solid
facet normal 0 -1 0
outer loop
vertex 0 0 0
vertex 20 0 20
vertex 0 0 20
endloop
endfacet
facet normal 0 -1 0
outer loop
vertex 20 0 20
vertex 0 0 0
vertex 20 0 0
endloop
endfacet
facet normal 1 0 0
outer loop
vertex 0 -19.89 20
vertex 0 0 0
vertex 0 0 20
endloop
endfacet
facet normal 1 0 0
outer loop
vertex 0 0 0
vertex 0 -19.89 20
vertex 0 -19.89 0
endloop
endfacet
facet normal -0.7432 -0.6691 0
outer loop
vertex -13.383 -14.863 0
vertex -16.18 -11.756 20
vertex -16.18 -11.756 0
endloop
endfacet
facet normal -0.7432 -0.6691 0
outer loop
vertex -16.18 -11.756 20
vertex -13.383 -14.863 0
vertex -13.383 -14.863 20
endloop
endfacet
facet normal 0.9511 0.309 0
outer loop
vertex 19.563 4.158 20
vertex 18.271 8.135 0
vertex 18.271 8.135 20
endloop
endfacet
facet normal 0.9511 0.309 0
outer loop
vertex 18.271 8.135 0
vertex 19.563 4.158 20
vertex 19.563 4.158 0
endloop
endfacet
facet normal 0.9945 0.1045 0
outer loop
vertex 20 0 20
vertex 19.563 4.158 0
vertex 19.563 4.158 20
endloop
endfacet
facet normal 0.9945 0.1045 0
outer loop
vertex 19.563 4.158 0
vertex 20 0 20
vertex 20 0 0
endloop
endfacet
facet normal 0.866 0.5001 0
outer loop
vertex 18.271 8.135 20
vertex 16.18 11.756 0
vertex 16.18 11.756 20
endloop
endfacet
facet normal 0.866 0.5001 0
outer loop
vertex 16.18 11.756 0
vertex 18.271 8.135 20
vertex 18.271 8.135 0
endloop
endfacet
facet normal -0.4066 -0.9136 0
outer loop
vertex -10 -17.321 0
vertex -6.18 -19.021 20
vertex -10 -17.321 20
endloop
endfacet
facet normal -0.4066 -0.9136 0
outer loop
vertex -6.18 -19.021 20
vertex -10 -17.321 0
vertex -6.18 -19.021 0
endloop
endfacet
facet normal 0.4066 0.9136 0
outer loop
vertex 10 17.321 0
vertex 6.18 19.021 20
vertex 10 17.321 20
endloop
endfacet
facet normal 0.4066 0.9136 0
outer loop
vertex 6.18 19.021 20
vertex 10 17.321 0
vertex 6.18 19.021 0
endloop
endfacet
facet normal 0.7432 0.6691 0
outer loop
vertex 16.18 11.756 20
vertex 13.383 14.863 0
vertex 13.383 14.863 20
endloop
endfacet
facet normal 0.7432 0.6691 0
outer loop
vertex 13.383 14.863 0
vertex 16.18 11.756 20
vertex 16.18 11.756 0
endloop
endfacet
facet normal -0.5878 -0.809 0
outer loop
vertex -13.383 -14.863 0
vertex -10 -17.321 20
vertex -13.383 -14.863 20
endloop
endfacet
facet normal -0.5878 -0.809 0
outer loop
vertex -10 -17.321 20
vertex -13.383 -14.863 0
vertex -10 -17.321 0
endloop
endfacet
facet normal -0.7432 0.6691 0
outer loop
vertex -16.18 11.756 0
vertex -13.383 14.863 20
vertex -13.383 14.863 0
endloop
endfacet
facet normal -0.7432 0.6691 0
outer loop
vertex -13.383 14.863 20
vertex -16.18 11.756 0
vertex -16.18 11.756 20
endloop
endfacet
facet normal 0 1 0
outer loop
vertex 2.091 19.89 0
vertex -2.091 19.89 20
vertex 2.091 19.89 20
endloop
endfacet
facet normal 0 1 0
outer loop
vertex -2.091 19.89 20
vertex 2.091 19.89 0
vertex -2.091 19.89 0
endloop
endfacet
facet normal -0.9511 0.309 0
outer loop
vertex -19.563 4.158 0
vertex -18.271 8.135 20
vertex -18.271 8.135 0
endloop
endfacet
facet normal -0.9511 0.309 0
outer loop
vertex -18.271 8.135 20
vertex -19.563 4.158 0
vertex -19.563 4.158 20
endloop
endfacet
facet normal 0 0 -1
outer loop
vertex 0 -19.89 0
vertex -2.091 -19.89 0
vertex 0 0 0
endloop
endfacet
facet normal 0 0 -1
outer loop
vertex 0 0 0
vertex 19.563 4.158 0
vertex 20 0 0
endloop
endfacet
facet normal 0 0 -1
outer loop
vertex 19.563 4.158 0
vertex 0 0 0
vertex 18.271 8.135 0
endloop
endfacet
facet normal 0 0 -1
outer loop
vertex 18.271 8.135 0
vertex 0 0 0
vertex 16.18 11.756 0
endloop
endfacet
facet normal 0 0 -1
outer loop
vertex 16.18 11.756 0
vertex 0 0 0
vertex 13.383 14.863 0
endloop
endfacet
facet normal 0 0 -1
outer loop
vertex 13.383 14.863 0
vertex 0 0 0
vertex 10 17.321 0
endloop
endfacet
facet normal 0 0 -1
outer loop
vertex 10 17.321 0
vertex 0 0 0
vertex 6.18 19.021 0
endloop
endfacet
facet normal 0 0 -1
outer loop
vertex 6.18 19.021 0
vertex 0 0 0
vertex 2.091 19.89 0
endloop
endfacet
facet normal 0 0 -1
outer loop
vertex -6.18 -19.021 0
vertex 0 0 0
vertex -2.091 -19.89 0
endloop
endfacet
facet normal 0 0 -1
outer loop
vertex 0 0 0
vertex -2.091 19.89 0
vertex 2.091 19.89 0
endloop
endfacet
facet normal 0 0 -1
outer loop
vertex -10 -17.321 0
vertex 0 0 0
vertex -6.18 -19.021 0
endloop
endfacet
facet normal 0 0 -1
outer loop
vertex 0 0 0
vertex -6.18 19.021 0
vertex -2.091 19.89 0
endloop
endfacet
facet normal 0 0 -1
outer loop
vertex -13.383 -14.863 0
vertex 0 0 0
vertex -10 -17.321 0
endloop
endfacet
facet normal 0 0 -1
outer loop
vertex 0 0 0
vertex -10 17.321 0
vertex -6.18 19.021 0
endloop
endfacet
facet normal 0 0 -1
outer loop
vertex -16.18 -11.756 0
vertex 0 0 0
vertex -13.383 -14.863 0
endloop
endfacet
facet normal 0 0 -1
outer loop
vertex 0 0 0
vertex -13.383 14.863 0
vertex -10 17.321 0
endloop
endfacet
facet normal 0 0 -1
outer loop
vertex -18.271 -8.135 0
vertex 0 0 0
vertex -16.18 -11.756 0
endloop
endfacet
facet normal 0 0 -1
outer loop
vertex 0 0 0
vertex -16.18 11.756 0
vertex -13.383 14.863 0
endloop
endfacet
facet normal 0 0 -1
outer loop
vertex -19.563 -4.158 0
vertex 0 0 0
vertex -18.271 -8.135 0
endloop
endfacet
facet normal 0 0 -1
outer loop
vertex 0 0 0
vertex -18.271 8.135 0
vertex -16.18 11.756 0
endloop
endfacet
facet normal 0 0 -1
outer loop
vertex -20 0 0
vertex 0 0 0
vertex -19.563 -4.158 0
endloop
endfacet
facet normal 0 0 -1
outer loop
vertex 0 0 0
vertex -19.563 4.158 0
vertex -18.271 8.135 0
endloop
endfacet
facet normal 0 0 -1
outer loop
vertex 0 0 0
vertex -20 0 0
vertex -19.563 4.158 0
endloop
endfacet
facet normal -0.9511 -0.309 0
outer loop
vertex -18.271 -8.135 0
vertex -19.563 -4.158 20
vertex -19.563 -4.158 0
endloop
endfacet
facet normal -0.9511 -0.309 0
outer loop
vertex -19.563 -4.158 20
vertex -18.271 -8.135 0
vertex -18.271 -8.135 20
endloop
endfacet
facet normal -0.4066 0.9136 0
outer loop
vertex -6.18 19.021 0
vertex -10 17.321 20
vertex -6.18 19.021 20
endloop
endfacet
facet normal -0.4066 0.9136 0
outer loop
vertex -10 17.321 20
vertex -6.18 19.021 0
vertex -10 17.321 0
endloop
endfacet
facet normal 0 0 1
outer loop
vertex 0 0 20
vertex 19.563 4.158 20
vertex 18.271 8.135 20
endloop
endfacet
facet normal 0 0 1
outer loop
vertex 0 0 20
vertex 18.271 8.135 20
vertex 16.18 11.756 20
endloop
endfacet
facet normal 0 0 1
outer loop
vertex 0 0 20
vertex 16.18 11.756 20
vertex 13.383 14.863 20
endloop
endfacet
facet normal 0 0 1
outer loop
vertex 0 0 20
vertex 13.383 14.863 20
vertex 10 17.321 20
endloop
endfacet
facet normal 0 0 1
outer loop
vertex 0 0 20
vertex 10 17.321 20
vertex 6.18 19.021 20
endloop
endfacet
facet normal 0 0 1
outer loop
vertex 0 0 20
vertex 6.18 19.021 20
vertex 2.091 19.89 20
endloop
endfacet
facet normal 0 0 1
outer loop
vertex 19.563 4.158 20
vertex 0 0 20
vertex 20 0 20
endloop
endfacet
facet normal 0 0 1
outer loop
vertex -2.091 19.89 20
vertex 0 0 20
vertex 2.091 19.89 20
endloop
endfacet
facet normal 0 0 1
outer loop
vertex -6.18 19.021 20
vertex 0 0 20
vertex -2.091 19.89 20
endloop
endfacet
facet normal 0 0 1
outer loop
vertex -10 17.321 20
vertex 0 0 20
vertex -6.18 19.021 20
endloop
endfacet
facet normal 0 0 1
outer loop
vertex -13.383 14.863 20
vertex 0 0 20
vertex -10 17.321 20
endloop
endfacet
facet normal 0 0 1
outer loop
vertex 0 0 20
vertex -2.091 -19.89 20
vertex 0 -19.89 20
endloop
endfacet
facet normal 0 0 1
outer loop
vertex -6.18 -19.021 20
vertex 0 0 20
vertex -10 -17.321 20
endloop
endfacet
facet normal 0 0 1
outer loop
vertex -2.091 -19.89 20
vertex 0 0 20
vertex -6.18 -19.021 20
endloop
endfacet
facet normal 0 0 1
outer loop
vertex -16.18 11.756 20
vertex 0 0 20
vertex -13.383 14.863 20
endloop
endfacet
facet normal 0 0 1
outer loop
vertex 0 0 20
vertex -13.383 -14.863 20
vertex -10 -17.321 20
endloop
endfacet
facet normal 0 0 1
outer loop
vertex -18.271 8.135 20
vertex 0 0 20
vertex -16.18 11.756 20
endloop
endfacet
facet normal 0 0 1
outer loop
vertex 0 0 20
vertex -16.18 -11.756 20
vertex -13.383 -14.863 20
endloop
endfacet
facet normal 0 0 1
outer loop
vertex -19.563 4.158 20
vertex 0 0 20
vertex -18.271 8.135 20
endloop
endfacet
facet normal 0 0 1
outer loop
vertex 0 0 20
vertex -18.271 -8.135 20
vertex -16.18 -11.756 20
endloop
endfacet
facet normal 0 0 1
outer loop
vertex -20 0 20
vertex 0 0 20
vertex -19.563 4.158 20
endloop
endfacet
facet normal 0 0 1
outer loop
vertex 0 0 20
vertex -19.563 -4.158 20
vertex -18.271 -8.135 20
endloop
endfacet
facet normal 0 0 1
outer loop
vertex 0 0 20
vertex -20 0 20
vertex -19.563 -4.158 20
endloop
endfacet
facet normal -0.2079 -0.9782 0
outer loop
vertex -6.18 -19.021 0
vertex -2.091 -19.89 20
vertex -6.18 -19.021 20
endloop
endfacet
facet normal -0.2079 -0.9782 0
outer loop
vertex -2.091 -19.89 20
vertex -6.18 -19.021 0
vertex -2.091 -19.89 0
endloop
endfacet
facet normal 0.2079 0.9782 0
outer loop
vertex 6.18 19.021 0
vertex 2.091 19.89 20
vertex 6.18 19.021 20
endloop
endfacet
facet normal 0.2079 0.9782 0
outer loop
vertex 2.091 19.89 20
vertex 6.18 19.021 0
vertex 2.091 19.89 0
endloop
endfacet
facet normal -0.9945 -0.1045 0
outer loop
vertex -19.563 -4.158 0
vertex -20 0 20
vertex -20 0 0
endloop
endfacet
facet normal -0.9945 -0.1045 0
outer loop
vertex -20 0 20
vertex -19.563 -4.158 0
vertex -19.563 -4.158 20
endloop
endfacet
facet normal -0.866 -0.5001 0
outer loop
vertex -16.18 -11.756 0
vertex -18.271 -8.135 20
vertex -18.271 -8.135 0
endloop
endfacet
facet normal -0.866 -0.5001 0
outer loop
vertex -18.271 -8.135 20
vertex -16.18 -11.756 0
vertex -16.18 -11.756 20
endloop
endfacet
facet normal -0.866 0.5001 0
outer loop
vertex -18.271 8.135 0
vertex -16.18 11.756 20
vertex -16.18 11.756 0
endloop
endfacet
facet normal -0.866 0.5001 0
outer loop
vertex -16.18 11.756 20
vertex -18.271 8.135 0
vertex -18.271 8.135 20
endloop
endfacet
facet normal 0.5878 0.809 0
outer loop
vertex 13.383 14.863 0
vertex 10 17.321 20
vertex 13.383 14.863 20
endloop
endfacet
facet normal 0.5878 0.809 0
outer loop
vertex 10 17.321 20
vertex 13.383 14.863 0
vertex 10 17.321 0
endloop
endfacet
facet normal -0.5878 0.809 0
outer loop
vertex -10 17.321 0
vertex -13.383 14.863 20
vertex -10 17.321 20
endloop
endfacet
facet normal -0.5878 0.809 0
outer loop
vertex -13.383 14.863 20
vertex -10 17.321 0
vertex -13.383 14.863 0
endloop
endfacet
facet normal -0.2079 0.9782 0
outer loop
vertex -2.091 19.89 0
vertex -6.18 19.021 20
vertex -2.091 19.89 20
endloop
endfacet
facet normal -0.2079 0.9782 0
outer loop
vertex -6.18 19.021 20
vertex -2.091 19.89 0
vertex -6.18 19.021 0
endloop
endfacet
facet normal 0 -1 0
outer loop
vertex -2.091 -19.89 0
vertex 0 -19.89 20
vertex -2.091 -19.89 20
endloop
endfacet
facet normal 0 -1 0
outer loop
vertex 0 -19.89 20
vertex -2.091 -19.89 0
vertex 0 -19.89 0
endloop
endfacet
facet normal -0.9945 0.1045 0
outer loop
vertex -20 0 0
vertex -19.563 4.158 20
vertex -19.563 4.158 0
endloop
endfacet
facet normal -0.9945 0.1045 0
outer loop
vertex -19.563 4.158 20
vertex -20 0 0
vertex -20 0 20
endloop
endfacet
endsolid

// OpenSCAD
// Transformations v.02
// (C) @oblomobka - 2015.04
// GPL3

// Transforma una forma en un sector de esa forma según un ángulo dado.

module sector(	angle, 		// es el ángulo del sector, lo que quedará de la forma original
				d=1000,		// valor auxiliar, será como mínimo igual al diámetro del cilindro que envuelve la forma original
				h=1000		// valor auxiliar, será como mínimo igual a la altura del cilindro que envuelve la forma original
				){

POINTS=[	[0,0,-h],
            [0,0,h],
            [d*cos(0*angle/4),d*sin(0*angle/4),-h],
            [d*cos(0*angle/4),d*sin(0*angle/4),h],
            [d*cos(1*angle/4),d*sin(1*angle/4),-h],
            [d*cos(1*angle/4),d*sin(1*angle/4),h],
            [d*cos(2*angle/4),d*sin(2*angle/4),-h],
            [d*cos(2*angle/4),d*sin(2*angle/4),h],
            [d*cos(3*angle/4),d*sin(3*angle/4),-h],
            [d*cos(3*angle/4),d*sin(3*angle/4),h],
            [d*cos(4*angle/4),d*sin(4*angle/4),-h],
            [d*cos(4*angle/4),d*sin(4*angle/4),h],
            ];

TRIANGLES=[	[0,1,2],
			[1,3,2],
			[2,3,4],
			[3,5,4],
			[4,5,6],
			[5,7,6],
			[6,7,8],
			[7,9,8],
			[8,9,10],
			[9,11,10],
			[10,11,0],
			[11,1,0],

			[5,3,1],
			[7,5,1],
			[9,7,1],
			[11,9,1],
			[0,2,4],
			[0,4,6],
			[0,6,8],
			[0,8,10]
			];

if(angle<=0 || angle>=360){
	children();
	}
	else{
		intersection(){
			polyhedron(points=POINTS,faces=TRIANGLES);
			children();
			}
		}
}


// Ejemplo
sector (270)
    cylinder(r=40/2,h=20); 
